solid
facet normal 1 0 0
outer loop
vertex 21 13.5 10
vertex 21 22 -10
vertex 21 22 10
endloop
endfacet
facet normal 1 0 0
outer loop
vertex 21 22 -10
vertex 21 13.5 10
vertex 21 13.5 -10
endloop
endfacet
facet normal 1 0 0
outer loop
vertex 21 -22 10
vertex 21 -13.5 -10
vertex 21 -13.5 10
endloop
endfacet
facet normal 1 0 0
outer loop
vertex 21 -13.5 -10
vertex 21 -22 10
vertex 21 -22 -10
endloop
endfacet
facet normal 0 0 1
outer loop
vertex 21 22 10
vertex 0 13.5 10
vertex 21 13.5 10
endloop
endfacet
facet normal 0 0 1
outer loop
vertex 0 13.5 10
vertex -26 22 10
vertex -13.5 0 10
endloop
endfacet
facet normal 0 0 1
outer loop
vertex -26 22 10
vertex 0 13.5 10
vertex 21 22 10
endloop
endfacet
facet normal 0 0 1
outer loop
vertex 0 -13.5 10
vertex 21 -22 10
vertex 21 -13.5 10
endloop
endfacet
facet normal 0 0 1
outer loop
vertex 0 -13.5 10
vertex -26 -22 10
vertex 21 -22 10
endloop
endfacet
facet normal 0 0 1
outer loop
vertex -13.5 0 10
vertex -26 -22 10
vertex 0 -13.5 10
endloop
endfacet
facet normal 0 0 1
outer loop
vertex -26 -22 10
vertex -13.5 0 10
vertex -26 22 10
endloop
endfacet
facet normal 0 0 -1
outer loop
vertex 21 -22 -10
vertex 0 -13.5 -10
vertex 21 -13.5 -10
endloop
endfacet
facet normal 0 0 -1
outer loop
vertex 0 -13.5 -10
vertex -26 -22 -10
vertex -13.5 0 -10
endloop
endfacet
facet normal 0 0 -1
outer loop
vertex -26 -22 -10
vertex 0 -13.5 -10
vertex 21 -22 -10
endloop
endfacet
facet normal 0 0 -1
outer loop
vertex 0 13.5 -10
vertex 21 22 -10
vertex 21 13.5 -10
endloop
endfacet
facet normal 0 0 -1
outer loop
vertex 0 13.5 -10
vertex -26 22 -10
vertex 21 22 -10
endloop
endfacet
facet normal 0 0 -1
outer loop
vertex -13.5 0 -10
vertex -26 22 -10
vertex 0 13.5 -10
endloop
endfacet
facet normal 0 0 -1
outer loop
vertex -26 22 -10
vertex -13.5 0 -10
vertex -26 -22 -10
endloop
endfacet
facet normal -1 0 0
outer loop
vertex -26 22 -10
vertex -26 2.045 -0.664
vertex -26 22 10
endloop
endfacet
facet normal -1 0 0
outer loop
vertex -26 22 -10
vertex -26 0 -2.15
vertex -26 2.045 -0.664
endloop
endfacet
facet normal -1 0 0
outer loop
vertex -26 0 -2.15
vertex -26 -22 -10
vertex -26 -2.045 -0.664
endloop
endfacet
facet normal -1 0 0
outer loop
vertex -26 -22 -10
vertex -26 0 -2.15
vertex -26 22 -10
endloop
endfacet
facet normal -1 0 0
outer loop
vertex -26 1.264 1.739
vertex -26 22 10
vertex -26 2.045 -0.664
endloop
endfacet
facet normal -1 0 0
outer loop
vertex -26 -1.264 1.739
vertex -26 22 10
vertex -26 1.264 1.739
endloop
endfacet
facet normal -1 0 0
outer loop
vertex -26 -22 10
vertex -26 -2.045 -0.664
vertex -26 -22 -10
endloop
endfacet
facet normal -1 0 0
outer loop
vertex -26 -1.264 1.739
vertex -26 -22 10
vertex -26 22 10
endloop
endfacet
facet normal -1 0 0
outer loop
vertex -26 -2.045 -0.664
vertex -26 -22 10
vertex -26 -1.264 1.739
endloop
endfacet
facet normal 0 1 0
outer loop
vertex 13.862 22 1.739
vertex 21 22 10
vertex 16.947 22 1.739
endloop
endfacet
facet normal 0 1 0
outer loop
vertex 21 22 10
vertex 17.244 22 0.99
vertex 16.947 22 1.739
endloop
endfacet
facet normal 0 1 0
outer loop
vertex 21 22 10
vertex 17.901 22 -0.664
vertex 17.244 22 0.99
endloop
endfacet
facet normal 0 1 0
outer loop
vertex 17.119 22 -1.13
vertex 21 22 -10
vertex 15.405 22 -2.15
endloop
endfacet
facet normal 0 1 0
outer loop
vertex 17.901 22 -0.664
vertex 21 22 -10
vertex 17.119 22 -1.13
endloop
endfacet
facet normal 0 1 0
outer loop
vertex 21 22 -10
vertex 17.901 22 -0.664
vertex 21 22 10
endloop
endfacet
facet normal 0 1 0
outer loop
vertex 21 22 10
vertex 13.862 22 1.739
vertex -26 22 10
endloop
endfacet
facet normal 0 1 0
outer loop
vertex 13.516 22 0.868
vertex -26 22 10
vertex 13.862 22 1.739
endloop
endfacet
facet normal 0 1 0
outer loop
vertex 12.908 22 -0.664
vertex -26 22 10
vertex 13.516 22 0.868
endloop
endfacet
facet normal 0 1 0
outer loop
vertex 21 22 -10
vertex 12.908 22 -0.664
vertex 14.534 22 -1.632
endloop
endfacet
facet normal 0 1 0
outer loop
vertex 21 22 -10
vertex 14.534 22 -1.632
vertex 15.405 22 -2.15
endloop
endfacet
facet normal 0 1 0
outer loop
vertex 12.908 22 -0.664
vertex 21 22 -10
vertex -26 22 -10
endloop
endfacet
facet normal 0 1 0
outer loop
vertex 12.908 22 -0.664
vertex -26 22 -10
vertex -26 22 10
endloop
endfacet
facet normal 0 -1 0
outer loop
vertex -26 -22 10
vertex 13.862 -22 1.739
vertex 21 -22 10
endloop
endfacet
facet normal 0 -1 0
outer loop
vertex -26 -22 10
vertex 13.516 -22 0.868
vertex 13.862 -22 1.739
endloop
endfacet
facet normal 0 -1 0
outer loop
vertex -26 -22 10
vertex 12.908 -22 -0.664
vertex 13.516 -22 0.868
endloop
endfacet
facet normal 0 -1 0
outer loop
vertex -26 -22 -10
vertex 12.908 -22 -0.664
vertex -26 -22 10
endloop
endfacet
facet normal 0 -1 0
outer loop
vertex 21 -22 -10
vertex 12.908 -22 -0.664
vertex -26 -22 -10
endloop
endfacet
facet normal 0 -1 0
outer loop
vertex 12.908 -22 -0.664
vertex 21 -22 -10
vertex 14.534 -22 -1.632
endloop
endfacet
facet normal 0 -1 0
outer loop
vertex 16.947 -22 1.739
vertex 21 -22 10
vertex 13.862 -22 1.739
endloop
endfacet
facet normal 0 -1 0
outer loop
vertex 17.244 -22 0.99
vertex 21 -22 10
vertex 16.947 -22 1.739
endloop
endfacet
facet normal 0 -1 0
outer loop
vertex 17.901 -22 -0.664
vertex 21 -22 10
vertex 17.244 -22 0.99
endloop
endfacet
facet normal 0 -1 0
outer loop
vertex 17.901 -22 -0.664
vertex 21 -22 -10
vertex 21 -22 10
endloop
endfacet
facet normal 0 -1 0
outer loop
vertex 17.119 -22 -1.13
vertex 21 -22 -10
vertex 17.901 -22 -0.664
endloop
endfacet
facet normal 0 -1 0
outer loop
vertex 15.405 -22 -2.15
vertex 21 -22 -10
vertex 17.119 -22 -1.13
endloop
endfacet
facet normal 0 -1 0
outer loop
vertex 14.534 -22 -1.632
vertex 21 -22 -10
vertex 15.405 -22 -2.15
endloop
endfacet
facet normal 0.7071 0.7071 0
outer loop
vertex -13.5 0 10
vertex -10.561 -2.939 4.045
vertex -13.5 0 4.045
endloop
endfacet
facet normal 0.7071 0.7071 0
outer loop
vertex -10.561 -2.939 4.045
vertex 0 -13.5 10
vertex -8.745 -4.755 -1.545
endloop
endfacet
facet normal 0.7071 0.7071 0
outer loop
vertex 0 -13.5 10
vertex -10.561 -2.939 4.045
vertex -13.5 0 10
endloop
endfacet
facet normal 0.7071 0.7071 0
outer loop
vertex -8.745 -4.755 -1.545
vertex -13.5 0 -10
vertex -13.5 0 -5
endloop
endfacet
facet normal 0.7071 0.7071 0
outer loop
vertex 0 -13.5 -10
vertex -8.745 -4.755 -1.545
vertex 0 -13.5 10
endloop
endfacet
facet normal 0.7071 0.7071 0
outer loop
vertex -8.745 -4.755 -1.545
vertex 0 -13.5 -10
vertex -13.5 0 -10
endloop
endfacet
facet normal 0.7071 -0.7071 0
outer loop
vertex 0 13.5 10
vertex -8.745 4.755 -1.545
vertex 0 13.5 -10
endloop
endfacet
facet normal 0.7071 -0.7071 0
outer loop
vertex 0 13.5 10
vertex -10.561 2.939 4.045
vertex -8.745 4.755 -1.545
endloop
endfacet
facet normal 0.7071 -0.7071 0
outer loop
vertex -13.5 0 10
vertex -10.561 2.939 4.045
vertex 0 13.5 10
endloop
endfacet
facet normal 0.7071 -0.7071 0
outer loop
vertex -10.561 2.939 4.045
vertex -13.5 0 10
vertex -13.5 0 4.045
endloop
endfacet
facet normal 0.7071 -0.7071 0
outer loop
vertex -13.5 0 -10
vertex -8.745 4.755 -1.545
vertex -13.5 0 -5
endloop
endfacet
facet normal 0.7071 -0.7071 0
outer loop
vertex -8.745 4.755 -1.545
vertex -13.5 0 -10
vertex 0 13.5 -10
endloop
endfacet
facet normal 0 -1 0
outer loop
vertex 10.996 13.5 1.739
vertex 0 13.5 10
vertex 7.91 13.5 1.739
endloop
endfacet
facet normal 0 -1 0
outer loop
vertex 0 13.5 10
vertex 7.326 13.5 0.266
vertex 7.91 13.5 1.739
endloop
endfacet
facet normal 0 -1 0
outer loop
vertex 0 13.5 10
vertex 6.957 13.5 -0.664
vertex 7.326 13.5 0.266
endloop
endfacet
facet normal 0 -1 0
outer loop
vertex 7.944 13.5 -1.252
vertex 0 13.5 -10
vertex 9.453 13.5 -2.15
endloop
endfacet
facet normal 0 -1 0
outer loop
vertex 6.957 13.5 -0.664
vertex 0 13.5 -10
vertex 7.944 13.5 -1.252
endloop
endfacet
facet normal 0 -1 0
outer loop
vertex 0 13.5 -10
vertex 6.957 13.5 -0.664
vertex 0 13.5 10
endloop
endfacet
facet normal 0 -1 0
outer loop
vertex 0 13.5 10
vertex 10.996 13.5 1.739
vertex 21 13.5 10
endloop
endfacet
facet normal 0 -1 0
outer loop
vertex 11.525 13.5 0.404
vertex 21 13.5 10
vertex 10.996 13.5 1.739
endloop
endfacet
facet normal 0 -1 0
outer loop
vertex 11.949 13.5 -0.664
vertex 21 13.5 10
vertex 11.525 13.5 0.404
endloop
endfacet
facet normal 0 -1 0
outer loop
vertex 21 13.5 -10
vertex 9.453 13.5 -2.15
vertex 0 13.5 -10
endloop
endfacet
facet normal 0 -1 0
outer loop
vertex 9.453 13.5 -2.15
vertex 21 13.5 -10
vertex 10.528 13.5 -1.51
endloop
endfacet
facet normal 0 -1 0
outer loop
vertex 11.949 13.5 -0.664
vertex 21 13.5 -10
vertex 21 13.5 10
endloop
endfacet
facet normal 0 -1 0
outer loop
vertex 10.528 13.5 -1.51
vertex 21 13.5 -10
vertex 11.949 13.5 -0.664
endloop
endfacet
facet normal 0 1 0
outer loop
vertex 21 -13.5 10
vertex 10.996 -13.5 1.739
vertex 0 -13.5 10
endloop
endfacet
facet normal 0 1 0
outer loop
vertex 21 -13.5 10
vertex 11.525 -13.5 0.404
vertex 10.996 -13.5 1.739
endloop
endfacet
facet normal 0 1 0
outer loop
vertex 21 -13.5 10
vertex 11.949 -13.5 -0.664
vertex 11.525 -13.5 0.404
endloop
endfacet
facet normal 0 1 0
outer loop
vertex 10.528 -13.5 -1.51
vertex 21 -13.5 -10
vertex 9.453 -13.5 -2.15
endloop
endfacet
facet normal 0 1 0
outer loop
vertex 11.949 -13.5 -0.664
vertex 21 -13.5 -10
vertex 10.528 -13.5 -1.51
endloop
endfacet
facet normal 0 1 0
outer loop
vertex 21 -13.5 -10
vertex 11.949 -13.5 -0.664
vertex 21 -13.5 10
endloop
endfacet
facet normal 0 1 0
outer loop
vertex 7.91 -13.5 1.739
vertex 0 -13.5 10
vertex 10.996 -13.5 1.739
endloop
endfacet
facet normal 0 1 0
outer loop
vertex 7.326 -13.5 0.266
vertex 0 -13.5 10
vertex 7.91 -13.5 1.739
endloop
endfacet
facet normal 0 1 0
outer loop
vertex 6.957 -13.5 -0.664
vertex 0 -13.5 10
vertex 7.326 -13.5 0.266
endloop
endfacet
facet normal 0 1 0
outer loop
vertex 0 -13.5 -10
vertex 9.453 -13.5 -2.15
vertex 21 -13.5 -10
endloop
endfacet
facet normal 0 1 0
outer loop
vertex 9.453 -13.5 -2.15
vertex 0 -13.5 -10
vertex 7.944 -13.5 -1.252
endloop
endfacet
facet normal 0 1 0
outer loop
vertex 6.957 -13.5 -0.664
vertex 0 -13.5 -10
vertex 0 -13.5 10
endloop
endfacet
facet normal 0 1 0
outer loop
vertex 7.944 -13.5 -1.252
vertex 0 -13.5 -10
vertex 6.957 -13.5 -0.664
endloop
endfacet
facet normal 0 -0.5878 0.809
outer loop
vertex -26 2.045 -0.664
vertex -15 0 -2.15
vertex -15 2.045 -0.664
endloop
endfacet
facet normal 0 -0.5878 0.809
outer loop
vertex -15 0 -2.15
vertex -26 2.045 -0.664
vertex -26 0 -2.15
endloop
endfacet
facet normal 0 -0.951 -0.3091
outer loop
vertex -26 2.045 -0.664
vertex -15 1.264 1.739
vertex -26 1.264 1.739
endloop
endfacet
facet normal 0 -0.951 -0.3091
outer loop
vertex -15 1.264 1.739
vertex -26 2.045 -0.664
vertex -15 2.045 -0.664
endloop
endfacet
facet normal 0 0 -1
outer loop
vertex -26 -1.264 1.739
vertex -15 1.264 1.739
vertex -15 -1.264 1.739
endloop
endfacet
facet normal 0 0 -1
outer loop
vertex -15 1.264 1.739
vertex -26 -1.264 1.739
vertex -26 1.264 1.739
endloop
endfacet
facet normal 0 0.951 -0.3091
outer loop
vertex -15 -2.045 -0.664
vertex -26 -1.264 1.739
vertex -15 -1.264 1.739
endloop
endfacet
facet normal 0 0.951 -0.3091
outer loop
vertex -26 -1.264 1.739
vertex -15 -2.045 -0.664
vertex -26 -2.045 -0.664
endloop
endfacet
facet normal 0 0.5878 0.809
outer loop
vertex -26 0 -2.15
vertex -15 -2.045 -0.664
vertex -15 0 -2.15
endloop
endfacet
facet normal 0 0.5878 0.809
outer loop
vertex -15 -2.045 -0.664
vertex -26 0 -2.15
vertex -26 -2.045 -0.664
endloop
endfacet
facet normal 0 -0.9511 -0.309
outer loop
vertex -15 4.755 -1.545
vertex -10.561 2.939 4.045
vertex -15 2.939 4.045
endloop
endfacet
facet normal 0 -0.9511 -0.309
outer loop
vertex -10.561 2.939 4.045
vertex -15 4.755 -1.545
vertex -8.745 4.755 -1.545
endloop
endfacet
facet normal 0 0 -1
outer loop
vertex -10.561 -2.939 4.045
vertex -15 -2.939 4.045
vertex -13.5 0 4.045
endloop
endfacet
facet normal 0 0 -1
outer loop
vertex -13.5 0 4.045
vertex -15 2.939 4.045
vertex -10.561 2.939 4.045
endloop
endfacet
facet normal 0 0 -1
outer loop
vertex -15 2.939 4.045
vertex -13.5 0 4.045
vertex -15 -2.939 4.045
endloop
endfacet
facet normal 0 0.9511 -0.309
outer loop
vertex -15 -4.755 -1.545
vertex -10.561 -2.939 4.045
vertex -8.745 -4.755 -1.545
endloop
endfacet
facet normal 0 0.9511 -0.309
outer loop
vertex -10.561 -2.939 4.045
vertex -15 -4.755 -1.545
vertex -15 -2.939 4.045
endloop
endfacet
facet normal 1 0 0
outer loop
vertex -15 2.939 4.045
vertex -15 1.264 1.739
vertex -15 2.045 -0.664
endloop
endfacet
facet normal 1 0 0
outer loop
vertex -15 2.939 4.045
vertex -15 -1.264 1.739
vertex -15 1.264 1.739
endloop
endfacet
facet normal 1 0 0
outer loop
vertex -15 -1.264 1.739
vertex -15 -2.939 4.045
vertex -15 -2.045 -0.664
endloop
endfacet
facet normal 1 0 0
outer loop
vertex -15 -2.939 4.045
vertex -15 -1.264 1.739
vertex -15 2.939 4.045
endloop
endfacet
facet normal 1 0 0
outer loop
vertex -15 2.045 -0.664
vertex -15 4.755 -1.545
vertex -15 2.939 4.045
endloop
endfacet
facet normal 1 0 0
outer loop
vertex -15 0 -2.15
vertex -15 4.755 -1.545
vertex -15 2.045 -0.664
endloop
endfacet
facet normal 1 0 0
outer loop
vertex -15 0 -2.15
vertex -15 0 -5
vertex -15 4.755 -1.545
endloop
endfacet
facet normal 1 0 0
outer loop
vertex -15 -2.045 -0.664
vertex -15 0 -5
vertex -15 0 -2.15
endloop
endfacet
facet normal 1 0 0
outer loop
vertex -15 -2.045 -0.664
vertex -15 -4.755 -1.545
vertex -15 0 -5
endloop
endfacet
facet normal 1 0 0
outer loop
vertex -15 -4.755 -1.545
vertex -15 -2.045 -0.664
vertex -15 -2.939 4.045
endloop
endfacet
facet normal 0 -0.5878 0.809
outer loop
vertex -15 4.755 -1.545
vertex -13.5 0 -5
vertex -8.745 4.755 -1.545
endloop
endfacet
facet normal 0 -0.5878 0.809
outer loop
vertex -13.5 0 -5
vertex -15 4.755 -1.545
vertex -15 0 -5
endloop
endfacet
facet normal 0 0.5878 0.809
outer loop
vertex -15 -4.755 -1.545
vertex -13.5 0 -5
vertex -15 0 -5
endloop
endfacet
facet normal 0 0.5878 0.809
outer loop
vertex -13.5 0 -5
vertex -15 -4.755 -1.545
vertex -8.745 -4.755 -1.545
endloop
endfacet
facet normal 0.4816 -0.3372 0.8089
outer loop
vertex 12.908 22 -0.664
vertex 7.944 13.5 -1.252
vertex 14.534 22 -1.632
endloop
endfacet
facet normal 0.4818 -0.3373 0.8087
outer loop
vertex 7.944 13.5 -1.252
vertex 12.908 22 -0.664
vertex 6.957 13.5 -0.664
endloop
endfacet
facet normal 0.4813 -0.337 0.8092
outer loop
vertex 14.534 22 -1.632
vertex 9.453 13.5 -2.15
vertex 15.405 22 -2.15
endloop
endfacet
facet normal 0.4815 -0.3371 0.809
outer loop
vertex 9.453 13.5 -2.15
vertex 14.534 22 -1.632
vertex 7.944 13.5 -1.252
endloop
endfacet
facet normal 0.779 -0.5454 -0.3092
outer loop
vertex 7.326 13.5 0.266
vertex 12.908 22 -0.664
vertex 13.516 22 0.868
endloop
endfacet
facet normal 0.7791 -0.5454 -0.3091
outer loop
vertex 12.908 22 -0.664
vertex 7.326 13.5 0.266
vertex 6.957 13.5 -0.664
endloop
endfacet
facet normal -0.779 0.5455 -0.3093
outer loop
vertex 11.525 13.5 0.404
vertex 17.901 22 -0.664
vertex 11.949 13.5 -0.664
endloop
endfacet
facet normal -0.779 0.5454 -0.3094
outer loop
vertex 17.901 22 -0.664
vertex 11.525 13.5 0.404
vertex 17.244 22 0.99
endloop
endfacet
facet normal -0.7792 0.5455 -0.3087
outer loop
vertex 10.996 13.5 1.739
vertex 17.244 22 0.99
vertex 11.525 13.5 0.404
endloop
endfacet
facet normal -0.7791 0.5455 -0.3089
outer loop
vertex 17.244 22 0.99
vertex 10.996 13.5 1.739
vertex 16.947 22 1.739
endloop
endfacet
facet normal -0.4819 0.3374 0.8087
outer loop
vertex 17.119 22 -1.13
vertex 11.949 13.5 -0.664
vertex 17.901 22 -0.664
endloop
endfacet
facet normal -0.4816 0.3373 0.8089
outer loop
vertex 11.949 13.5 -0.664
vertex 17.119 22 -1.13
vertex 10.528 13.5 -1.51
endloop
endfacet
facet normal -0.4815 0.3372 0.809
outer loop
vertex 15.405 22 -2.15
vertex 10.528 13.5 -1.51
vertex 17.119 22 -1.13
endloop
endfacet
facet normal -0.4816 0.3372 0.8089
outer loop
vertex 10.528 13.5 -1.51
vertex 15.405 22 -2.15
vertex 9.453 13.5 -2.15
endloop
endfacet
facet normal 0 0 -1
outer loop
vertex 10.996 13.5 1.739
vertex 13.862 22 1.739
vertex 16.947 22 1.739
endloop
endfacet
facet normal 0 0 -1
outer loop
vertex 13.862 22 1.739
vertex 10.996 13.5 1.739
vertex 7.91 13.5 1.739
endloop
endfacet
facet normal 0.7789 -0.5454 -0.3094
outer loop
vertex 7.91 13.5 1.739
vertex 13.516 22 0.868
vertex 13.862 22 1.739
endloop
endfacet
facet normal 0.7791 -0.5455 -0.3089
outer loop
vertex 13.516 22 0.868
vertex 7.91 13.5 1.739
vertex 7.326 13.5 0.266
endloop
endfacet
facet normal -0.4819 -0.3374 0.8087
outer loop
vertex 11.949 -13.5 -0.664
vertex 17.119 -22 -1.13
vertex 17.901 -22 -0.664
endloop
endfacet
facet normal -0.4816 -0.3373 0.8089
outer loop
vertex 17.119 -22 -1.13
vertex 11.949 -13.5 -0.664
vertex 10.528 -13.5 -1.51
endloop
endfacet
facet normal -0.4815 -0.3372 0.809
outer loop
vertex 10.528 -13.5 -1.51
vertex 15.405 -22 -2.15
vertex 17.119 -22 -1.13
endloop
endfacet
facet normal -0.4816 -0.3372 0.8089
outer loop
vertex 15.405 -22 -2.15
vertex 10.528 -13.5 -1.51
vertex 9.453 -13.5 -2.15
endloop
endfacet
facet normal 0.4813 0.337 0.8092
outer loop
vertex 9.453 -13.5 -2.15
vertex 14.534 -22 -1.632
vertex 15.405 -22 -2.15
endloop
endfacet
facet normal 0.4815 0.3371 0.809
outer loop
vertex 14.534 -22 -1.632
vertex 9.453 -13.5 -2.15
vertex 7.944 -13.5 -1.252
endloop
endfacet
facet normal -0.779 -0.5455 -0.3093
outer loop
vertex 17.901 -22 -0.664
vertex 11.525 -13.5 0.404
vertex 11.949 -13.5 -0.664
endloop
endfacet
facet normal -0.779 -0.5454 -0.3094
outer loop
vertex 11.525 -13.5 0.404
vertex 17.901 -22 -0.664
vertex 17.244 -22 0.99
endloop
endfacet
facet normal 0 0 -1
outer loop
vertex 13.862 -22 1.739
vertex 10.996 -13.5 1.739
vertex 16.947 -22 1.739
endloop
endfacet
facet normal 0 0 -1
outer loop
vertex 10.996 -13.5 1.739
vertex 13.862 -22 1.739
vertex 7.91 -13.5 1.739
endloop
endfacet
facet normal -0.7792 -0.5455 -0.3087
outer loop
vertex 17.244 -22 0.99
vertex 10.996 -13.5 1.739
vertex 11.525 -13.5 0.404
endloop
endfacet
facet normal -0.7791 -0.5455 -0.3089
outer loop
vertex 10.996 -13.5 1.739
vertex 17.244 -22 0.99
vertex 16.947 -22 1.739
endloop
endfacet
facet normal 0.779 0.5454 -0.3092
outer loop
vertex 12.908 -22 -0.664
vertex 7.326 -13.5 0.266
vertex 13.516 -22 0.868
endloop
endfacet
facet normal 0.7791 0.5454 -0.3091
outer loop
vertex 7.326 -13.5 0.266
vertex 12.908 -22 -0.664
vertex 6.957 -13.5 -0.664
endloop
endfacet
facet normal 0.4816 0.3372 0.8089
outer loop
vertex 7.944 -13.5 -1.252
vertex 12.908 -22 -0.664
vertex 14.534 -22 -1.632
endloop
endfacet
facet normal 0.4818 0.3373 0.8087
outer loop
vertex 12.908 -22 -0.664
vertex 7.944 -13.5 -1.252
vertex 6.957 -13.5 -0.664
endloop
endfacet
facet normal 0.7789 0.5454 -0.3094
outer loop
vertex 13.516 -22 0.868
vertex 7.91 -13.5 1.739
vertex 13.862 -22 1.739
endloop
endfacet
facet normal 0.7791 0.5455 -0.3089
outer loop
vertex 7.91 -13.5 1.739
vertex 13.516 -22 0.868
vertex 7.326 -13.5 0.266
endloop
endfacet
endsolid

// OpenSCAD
difference() {
    translate([-2.5,0,0]) cube([47,44,20], true);
    translate([0,0,0]) rotate([0,0,45]) cube([27/sqrt(2),27/sqrt(2),21], true);
    translate([27/2,0,0]) cube([27,27,21], true);
    rotate([0,90,0]) cylinder(d=4.3, h=70, center=true, $fn=5);
    rotate([0,90,0]) cylinder(d=10, h=30, center=true, $fn=5);
    rotate([0,0,55]) translate([20,0,0]) rotate([0,90,0]) cylinder(d=4.3, h=42, center=true, $fn=5);
    rotate([0,0,-55]) translate([20,0,0]) rotate([0,90,0]) cylinder(d=4.3, h=42, center=true, $fn=5);
}
